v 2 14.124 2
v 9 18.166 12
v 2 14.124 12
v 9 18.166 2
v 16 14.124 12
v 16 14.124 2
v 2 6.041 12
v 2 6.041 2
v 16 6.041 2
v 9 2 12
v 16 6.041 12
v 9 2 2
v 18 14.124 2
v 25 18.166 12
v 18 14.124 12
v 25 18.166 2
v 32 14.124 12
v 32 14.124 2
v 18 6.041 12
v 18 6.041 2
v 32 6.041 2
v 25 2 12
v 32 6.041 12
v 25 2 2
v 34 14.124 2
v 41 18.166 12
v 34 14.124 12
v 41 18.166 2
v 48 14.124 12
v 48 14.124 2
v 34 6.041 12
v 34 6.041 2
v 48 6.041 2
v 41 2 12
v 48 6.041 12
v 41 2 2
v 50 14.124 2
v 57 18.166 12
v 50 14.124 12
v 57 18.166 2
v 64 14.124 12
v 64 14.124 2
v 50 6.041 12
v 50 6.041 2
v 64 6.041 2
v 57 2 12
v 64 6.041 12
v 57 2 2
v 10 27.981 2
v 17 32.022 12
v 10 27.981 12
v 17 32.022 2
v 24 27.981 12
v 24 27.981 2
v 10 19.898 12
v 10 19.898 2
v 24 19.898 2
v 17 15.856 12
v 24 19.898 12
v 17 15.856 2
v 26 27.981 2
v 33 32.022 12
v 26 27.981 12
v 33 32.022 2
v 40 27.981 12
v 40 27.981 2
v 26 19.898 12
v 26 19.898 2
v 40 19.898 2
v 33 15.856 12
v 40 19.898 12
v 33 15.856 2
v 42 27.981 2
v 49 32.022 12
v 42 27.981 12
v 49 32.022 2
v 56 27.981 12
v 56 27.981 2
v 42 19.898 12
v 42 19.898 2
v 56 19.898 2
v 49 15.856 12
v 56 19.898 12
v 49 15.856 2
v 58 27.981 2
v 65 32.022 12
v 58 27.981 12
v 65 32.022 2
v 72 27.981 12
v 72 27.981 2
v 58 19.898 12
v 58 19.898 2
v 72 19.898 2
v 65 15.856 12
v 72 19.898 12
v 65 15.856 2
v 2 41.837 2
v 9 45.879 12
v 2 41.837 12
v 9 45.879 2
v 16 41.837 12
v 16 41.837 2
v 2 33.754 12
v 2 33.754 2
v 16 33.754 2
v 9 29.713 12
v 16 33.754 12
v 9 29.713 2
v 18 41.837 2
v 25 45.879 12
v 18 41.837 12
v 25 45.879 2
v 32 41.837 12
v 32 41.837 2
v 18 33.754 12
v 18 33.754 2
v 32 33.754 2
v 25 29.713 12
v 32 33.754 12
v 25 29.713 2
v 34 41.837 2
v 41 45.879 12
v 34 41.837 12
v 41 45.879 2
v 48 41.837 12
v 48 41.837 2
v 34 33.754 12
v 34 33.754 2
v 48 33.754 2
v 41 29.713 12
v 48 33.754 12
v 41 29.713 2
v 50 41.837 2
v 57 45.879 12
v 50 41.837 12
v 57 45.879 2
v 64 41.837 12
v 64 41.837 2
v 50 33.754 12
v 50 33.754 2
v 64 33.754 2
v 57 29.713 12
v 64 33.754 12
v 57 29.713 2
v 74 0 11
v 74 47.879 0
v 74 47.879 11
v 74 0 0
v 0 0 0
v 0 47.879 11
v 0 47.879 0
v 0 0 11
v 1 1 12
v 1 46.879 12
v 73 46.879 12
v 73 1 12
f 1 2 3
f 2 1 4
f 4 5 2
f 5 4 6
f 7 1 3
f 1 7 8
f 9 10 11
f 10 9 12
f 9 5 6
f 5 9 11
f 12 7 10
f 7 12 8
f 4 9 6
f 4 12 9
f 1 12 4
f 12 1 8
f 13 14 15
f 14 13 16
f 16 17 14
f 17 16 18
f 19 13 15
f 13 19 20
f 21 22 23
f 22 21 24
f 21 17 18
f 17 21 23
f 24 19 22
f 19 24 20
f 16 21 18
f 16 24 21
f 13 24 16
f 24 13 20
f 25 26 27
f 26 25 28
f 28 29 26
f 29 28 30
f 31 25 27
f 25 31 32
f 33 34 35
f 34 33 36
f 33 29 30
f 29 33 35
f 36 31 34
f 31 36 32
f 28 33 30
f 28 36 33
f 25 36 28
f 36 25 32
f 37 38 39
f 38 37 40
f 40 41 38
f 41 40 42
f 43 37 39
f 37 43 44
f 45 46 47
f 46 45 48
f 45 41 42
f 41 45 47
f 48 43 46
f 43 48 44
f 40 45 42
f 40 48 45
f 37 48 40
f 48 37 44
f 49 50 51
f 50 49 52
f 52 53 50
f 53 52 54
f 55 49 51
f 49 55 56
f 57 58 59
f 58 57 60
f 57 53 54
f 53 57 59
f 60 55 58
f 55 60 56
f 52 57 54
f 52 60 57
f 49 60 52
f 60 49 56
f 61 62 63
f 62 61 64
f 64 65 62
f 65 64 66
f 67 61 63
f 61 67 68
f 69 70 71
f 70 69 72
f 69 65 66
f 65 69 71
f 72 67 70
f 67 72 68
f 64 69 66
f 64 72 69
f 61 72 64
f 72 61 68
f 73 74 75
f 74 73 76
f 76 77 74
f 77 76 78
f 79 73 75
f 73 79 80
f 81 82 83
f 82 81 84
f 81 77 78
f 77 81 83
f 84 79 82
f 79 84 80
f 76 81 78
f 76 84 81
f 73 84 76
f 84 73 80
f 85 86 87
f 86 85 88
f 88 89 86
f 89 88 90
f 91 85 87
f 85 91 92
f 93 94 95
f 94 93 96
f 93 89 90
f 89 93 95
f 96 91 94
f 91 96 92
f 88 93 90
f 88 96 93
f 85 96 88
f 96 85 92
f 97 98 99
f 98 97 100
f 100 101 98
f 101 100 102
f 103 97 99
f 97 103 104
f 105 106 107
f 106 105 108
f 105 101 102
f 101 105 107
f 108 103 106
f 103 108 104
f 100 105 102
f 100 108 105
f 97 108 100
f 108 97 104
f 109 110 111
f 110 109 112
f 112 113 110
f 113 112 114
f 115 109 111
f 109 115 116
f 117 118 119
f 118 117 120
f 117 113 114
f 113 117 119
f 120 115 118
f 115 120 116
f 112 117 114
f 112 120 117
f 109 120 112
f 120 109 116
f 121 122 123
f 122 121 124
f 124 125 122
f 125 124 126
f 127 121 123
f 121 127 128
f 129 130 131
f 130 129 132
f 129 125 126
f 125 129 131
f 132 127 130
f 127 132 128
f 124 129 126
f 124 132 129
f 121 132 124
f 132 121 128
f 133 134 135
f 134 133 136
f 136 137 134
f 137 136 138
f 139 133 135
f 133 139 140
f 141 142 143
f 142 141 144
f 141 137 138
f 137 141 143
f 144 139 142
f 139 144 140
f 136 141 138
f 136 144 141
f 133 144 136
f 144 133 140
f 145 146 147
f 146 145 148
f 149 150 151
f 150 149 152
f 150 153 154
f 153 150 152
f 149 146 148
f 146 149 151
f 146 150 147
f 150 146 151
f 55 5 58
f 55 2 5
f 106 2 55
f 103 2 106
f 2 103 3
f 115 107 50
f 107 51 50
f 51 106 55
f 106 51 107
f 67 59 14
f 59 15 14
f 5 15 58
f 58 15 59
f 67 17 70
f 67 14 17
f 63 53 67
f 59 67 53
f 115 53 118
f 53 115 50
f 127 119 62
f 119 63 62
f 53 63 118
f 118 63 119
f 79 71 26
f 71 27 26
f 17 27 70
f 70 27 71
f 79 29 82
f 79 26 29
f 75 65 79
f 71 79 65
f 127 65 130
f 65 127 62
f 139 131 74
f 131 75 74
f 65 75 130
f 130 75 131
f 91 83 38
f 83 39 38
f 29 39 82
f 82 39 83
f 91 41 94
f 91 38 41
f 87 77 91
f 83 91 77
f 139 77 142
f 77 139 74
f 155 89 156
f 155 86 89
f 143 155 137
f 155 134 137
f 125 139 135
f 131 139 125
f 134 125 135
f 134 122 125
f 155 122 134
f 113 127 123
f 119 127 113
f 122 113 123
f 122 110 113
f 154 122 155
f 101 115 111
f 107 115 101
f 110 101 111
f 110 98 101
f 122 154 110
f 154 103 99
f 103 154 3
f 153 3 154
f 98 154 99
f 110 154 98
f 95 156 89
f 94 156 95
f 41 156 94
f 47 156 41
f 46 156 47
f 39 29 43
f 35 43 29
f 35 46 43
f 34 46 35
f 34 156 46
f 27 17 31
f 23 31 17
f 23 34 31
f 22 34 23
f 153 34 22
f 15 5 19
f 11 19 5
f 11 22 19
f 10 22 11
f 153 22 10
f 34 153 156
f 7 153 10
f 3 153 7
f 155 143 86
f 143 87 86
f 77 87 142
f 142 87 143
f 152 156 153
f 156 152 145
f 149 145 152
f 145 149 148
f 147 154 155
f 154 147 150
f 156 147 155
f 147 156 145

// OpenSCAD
// A tray of hexagonal pockets for small parts. Plain OpenSCAD, no libraries.
cols = 4;
rows = 3;
across = 14;     // pocket across flats
depth = 10;
wall = 2;
floor_t = 2;
rim = 1;         // chamfer on the top edge

corner = across / cos(30);          // pocket across corners
pitch_x = across + wall;            // neighbours in a row meet flat to flat
pitch_y = pitch_x * cos(30);        // and so do neighbours in the next row
size_x = (cols - 1) * pitch_x + pitch_x / 2 + across + 2 * wall;   // odd rows sit half a pitch over
size_y = (rows - 1) * pitch_y + corner + 2 * wall;

module pocket() {
    rotate([0, 0, 30]) cylinder(d = corner, h = depth + 1, $fn = 6);   // flats facing along x
}

difference() {
    hull() {
        cube([size_x, size_y, depth + floor_t - rim]);
        translate([rim, rim, 0]) cube([size_x - 2 * rim, size_y - 2 * rim, depth + floor_t]);
    }
    for (r = [0 : rows - 1]) for (c = [0 : cols - 1])
        translate([wall + across / 2 + c * pitch_x + (r % 2) * pitch_x / 2, wall + corner / 2 + r * pitch_y, floor_t])
            pocket();
}
